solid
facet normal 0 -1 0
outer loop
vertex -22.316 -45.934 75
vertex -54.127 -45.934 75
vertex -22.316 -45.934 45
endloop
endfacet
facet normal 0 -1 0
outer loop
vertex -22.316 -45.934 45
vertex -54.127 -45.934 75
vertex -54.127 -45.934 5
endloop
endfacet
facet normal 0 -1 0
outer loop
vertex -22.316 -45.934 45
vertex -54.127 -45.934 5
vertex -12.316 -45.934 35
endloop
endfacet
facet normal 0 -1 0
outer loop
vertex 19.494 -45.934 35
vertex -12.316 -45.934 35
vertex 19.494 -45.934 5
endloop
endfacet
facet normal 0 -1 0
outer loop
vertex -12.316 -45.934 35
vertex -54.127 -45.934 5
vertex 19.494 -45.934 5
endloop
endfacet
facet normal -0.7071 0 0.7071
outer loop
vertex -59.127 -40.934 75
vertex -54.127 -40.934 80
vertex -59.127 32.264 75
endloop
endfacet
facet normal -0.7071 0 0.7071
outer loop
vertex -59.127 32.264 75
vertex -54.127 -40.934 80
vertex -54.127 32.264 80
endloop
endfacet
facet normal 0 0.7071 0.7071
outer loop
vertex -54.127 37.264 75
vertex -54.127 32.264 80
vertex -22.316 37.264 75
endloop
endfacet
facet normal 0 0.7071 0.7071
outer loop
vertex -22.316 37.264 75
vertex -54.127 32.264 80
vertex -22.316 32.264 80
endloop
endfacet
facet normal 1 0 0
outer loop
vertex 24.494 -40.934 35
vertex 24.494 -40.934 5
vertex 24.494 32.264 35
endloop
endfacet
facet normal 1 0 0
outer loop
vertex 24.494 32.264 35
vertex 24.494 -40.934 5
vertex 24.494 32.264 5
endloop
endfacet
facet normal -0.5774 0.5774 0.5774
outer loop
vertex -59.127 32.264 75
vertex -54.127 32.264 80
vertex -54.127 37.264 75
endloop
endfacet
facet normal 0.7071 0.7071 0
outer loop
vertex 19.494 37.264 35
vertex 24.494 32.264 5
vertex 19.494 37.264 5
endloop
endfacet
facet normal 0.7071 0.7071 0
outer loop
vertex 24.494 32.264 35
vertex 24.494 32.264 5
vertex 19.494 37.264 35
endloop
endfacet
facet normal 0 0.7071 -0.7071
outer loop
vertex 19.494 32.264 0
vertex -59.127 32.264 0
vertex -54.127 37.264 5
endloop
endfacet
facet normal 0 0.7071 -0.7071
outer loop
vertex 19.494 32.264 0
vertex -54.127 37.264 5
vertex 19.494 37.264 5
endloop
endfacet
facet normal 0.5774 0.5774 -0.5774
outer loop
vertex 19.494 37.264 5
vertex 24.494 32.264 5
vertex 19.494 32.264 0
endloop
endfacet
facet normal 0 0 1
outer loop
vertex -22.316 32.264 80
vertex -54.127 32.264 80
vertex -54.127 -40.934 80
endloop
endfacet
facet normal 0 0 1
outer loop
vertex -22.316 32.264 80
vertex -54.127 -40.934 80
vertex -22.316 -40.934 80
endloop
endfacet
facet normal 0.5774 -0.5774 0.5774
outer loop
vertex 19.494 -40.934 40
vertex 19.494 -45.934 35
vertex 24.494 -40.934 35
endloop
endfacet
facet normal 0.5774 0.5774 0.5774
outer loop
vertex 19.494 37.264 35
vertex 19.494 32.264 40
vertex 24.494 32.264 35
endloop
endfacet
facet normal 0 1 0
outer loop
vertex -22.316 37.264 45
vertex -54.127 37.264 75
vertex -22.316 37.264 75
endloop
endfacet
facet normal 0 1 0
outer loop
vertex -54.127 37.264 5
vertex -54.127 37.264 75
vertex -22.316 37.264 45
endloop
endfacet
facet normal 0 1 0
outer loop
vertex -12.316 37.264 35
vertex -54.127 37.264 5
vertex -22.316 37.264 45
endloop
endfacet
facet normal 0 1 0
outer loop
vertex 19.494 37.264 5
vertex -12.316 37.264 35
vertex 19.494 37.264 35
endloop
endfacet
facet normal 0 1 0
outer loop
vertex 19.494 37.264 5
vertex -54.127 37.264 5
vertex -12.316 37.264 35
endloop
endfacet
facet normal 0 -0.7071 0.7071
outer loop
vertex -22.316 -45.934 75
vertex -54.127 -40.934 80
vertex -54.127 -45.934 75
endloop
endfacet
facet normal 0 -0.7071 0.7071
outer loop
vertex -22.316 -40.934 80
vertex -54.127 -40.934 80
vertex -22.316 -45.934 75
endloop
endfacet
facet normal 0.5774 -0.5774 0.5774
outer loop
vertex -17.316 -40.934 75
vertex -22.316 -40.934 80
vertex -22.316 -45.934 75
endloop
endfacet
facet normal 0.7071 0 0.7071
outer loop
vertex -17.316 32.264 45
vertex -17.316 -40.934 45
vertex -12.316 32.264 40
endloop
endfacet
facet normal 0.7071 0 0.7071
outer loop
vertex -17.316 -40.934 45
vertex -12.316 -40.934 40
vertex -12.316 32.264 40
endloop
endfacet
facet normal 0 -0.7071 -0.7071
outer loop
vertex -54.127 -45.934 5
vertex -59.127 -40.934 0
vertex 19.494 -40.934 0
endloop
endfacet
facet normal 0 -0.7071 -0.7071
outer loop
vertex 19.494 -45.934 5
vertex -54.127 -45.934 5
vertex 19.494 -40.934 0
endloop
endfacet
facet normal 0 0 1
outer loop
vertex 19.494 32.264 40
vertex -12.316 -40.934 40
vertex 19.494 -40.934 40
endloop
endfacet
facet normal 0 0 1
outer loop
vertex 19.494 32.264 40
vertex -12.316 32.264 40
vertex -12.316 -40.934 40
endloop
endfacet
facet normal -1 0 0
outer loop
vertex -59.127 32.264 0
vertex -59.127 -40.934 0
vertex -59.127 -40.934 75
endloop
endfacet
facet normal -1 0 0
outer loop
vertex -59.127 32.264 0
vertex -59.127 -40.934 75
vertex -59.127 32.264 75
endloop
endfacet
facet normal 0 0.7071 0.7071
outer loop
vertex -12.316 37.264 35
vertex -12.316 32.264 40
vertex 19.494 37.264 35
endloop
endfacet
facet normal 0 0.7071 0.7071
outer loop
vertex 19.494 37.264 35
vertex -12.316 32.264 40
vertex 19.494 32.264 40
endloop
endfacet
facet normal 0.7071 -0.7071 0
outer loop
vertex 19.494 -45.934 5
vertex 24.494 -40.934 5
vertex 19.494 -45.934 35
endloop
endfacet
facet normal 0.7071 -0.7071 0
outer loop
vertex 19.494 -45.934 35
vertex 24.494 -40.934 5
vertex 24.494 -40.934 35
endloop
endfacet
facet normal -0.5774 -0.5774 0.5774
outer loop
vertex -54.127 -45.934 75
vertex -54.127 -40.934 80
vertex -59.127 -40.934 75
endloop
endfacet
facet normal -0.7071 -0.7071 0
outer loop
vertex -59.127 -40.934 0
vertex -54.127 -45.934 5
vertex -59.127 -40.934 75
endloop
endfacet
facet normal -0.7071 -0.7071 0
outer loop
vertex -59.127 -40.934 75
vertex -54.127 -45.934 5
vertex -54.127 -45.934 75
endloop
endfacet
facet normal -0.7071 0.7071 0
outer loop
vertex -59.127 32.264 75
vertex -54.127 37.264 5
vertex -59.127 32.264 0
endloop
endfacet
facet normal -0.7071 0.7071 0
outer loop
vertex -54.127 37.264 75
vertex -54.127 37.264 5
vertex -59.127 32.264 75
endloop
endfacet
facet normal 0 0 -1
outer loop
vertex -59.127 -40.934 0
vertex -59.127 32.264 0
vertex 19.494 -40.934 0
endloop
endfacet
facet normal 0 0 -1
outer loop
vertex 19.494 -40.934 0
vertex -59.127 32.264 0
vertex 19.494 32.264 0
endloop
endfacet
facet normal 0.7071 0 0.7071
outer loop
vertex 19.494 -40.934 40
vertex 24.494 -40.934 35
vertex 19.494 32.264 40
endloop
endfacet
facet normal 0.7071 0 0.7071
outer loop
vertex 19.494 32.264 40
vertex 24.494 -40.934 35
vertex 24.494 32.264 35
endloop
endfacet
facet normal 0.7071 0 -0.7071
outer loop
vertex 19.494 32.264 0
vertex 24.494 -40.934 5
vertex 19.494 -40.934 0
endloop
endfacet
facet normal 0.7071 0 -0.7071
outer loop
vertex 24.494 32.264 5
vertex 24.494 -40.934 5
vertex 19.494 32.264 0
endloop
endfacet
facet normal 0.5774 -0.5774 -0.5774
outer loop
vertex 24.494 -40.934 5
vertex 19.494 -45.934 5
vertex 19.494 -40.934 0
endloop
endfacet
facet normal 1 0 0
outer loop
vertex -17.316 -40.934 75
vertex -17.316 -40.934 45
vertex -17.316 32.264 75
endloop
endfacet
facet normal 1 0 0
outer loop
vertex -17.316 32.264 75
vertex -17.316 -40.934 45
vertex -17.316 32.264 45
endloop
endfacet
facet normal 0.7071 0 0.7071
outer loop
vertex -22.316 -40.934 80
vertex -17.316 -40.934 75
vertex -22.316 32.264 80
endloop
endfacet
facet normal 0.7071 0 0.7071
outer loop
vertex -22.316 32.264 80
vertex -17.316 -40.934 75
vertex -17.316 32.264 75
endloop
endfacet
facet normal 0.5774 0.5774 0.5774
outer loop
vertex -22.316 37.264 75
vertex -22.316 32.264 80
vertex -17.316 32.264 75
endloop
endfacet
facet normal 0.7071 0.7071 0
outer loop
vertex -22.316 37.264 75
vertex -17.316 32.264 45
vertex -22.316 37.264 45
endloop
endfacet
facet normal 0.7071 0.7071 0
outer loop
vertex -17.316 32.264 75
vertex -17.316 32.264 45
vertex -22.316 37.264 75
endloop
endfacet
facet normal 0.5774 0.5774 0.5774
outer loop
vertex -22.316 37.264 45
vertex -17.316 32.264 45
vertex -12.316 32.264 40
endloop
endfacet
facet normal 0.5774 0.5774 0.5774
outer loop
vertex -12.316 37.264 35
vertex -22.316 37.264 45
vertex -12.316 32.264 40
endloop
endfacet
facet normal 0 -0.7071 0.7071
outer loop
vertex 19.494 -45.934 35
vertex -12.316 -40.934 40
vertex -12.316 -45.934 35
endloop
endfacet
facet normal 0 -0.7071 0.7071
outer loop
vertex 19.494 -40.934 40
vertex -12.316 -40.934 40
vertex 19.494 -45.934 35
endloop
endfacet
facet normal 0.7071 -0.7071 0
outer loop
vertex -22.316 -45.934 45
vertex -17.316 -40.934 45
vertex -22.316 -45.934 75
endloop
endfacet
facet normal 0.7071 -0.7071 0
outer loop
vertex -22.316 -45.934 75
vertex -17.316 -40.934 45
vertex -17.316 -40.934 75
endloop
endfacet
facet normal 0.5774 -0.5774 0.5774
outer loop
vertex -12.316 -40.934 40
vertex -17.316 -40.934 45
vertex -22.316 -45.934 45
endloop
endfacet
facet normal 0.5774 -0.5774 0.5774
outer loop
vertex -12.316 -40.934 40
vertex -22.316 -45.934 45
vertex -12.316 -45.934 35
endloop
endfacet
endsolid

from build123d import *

# Parameters (mm, degrees)
F0_W     = 83.6216490716
F0_H     = 83.1985995173
F1_DEPTH = 40
F2_W     = 41.8108245358
F2_H     = 83.1985995173
F3_DEPTH = 40
F4_SIZE  = 5


with BuildPart() as f1:
    # F0 (on Top) → F1 (new body)
    with BuildSketch(Plane.XY):
        with Locations((-17.3164242879, -4.335001111)):
            Rectangle(F0_W, F0_H)
    extrude(amount=F1_DEPTH)

    # F2 (on face) → F3 (join)
    with BuildSketch(Plane.XY.offset(40)):
        with Locations((-38.2218365557, -4.335001111)):
            Rectangle(F2_W, F2_H)
    extrude(amount=F3_DEPTH)

    # F4
    f4_edges = [f1.edges().sort_by_distance(p)[0] for p in [
        (-17.316424, -4.335001, 80),
        (-38.221837, 37.264299, 80),
        (-59.127249, -4.335001, 80),
        (-38.221837, -45.934301, 80),
        (-59.127249, -45.934301, 40),
        (-17.316424, -45.934301, 60),
        (3.588988, -45.934301, 40),
        (24.4944, -45.934301, 20),
        (-17.316424, -45.934301, 0),
        (3.588988, 37.264299, 40),
        (24.4944, -4.335001, 40),
        (-17.316424, -4.335001, 40),
        (-17.316424, 37.264299, 60),
        (24.4944, 37.264299, 20),
        (24.4944, -4.335001, 0),
        (-59.127249, 37.264299, 40),
        (-17.316424, 37.264299, 0),
    ]]
    chamfer(f4_edges, length=F4_SIZE)


solid = f1.part
